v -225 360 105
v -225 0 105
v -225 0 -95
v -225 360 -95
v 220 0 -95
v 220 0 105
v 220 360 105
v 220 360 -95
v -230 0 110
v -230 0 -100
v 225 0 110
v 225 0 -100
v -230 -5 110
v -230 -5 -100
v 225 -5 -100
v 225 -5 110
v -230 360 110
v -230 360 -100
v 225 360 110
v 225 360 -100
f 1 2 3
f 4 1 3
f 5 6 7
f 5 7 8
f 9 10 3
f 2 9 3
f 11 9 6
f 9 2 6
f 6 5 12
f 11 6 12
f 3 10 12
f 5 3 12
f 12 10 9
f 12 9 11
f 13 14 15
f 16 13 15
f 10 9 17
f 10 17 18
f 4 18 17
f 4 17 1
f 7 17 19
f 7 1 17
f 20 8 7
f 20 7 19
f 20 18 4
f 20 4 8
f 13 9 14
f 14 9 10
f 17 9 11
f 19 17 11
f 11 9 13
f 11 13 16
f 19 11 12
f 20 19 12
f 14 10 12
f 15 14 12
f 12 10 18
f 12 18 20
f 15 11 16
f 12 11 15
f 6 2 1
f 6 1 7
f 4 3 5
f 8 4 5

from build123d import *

# Parameters (mm, degrees)
SKETCH2_W           = 455
SKETCH2_H           = 210
SKETCH2_W_2         = 445
SKETCH2_H_2         = 200
BOSS_EXTRUDE1_DEPTH = 360
SKETCH3_W           = 455
SKETCH3_H           = 210
BOSS_EXTRUDE4_DEPTH = 5


with BuildPart() as part:
    # Sketch2 → Boss-Extrude1 (new body)
    with BuildSketch(Plane(origin=(0, 0, 0), x_dir=(1, 0, 0), z_dir=(0, 1, 0))):
        with Locations((-2.5, -5)):
            Rectangle(SKETCH2_W, SKETCH2_H)
        with Locations((-2.5, -5)):
            Rectangle(SKETCH2_W_2, SKETCH2_H_2, mode=Mode.SUBTRACT)
    extrude(amount=BOSS_EXTRUDE1_DEPTH)


with BuildPart() as body_2:
    # Sketch3 → Boss-Extrude4 (new body)
    with BuildSketch(Plane(origin=(0, 0, 0), x_dir=(1, 0, 0), z_dir=(0, 1, 0))):
        with Locations((-2.5, -5)):
            Rectangle(SKETCH3_W, SKETCH3_H)
    extrude(amount=-BOSS_EXTRUDE4_DEPTH)


solid = Compound([part.part, body_2.part])
